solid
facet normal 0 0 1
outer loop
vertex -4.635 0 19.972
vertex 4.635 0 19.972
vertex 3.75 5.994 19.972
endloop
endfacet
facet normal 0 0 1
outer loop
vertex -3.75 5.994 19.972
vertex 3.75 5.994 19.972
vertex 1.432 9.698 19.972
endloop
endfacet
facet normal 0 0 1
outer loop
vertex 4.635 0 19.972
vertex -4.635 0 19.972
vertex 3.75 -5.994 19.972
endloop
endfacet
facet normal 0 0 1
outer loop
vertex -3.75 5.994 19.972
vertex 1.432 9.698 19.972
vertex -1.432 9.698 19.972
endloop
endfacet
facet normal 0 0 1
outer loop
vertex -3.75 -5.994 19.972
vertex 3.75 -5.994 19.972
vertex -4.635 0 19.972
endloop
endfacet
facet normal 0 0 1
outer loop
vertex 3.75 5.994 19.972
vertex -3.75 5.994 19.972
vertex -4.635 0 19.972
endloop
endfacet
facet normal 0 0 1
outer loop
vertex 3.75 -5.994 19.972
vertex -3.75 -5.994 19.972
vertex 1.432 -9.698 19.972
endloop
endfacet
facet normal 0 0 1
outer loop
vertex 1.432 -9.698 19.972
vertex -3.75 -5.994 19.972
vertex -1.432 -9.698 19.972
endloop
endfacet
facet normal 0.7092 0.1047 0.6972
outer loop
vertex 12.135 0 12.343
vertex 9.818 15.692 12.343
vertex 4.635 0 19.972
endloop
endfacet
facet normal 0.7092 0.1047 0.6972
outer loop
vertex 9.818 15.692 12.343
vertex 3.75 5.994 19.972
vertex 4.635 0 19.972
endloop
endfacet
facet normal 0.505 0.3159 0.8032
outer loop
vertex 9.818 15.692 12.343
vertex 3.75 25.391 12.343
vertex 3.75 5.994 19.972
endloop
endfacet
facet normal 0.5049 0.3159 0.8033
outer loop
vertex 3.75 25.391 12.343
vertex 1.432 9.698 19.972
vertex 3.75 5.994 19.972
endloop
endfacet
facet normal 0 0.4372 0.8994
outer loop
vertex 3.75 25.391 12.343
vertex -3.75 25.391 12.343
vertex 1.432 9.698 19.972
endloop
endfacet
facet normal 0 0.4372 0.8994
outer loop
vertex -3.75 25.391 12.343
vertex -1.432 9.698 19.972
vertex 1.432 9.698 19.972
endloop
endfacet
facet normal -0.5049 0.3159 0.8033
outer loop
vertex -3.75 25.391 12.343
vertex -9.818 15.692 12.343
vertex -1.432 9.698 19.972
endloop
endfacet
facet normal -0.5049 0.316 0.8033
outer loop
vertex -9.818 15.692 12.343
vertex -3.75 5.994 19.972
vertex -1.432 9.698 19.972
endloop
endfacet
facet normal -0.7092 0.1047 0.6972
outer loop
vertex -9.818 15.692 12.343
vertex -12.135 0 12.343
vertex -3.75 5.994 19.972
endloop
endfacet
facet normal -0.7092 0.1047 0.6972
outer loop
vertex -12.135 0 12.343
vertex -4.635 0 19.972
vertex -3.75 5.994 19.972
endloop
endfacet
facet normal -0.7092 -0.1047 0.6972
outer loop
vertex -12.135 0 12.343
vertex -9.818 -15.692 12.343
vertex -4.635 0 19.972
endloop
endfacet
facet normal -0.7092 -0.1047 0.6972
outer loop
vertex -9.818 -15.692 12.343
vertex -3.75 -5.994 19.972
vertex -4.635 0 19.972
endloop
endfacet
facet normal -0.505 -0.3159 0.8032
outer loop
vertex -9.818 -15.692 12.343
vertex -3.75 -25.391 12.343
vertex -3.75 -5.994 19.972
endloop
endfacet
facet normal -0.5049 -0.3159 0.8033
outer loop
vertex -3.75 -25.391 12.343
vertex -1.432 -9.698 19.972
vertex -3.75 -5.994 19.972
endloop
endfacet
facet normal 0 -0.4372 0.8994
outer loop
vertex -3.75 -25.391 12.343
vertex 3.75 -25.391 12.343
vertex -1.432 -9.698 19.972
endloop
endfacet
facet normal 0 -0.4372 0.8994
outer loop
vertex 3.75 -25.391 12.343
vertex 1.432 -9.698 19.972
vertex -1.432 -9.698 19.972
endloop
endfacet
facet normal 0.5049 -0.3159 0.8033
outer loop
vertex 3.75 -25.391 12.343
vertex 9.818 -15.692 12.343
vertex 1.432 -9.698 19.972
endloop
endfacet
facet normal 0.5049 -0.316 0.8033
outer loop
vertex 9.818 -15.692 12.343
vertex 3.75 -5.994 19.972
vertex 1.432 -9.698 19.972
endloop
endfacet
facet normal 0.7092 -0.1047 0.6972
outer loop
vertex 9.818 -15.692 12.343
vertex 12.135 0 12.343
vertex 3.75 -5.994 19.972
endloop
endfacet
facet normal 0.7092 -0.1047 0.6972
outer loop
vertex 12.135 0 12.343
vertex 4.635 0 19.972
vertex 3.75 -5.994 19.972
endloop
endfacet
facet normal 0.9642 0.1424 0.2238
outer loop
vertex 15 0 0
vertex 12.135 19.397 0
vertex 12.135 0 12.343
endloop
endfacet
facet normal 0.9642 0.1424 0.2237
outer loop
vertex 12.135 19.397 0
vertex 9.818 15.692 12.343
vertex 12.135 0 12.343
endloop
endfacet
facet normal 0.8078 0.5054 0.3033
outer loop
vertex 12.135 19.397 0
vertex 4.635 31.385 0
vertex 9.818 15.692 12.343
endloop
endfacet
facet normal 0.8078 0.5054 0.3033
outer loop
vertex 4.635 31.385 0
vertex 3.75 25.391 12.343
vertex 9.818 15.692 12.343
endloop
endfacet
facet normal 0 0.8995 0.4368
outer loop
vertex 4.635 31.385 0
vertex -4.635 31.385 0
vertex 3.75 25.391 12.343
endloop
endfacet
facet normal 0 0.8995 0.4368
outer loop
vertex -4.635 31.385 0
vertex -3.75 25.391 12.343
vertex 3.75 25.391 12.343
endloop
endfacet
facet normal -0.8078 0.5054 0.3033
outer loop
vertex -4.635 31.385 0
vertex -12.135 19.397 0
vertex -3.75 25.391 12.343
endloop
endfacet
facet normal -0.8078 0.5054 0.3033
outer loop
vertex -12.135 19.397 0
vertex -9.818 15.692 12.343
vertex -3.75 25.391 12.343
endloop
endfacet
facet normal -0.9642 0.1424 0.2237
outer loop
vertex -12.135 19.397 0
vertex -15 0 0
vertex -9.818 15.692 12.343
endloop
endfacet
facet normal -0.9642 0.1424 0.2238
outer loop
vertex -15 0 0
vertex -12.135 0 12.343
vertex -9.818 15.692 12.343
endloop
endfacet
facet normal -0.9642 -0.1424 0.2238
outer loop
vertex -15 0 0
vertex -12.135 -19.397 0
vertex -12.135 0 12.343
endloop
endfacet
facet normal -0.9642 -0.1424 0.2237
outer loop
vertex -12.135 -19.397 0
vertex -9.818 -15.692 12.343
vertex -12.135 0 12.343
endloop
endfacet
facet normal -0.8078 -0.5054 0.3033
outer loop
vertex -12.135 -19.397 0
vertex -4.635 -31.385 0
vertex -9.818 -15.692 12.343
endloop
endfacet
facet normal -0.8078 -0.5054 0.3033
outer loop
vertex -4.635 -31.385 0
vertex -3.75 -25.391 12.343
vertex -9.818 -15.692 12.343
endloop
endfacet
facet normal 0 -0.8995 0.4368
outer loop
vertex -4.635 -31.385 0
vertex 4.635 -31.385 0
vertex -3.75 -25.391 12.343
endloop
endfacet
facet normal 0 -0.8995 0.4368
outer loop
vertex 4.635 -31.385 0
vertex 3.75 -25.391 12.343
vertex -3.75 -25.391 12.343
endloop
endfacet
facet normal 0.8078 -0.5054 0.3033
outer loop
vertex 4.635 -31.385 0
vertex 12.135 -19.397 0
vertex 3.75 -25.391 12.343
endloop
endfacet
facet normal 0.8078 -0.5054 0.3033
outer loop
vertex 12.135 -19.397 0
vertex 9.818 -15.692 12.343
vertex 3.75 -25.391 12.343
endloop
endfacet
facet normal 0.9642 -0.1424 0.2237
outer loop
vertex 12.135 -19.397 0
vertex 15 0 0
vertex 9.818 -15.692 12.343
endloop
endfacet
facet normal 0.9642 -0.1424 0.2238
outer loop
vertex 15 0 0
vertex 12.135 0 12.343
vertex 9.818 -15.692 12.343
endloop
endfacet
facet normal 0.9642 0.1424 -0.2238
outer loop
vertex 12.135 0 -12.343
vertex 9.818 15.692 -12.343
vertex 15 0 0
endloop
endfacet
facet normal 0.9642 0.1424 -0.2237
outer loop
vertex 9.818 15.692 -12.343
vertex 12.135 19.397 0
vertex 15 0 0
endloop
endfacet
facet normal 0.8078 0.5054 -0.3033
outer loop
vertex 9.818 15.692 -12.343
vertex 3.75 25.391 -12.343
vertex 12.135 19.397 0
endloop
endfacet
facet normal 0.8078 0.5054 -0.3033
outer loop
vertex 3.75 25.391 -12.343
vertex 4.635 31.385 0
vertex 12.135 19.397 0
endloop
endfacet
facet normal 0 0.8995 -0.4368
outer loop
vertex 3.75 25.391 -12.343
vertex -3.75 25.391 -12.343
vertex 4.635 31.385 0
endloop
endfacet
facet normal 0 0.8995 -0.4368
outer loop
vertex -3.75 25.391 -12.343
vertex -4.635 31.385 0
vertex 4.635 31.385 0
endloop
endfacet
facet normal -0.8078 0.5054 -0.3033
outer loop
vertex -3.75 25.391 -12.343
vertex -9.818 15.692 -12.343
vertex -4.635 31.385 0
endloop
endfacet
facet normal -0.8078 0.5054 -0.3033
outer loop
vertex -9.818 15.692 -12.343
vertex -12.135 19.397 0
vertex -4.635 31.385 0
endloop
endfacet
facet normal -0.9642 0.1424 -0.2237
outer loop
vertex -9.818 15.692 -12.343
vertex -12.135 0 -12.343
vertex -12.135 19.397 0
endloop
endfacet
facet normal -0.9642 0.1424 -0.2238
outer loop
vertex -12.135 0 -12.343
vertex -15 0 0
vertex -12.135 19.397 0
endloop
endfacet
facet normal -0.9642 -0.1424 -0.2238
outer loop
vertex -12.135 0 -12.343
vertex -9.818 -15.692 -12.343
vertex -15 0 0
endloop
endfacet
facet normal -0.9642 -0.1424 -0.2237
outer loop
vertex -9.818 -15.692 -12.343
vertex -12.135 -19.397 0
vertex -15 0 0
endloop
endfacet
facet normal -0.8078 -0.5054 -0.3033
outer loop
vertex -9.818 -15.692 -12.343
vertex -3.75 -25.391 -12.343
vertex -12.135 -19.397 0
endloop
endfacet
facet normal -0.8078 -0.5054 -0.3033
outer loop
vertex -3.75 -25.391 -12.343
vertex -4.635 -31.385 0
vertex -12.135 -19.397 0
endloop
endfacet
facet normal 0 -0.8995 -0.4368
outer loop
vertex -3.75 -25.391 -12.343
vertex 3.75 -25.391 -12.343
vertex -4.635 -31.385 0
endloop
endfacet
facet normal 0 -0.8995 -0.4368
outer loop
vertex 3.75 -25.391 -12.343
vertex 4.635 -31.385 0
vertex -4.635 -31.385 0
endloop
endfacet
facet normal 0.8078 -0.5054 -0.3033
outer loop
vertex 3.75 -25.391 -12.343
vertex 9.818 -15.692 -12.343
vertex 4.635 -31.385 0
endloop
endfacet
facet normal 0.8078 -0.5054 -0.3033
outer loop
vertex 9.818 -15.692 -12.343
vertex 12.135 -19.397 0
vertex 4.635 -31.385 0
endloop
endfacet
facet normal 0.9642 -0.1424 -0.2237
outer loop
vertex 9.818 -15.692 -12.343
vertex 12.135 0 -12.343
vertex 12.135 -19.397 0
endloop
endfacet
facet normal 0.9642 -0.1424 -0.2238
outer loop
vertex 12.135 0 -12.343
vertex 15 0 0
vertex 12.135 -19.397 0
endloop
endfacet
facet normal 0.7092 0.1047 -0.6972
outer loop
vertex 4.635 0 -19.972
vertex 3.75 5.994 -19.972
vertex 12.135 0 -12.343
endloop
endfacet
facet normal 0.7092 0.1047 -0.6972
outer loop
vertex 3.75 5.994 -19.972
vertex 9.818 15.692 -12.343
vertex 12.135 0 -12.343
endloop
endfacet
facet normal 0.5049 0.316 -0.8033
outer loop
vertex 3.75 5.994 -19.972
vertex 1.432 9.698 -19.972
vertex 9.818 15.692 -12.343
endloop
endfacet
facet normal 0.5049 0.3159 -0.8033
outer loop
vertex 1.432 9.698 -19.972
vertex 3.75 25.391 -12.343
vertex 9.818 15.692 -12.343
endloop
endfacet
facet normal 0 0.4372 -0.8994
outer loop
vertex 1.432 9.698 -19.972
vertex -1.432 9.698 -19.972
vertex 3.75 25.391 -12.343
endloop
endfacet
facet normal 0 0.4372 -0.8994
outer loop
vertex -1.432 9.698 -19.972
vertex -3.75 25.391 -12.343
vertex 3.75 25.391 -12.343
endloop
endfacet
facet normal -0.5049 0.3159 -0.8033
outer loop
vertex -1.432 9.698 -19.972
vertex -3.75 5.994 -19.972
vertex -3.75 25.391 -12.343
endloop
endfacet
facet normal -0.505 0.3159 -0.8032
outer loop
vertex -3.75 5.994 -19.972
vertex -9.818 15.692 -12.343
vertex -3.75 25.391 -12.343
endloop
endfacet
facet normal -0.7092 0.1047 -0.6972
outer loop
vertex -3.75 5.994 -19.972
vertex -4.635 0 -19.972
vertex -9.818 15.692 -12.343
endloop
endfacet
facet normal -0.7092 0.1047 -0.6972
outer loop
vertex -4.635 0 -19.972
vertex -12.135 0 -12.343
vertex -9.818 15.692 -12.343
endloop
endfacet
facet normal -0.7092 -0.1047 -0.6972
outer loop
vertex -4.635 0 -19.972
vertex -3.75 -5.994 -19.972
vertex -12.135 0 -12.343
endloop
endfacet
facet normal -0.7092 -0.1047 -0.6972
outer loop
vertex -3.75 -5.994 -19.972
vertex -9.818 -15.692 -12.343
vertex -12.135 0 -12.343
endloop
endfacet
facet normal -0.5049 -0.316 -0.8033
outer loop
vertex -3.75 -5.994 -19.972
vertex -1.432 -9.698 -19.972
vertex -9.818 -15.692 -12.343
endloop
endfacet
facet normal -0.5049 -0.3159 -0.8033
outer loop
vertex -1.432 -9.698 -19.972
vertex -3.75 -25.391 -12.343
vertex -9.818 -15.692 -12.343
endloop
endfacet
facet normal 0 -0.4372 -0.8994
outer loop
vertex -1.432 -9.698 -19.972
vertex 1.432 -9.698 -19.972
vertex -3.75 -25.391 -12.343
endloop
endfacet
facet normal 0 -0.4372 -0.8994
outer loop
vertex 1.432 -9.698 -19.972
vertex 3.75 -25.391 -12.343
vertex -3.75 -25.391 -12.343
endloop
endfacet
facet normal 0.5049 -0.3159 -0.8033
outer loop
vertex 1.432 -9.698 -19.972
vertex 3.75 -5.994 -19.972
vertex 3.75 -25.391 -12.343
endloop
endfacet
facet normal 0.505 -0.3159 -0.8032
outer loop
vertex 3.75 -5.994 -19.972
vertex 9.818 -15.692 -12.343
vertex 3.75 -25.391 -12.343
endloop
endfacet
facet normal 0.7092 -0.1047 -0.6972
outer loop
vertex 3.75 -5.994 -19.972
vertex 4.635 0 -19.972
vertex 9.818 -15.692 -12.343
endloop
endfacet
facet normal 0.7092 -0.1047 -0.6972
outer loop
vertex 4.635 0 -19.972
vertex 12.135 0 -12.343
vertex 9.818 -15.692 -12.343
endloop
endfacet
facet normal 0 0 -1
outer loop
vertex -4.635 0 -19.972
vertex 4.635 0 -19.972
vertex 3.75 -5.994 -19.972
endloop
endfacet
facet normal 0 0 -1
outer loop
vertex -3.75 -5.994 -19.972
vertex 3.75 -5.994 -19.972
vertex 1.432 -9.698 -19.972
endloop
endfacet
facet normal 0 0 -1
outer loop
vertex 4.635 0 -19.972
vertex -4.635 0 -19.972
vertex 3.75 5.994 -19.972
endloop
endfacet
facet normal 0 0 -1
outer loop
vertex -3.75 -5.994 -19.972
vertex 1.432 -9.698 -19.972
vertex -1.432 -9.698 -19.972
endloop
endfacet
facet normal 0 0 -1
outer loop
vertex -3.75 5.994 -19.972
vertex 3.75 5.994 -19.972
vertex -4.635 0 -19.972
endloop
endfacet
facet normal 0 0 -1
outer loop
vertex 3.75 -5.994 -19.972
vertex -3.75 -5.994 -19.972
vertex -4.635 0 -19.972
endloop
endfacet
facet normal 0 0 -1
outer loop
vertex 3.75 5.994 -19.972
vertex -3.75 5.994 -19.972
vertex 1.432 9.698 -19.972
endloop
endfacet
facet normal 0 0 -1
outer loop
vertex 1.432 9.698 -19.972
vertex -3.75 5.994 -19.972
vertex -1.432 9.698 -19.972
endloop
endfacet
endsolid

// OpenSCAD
// Generated by SolidPython 1.0.1 on 2020-07-29 00:46:46


scale(v = [5, 11, 7]) {
	sphere(r = 3);
}
/***********************************************
*********      SolidPython code:      **********
************************************************
 
# import packages: SolidPython
from solid import *
from solid.utils import *
from itertools import chain, combinations, permutations


class Resize:

    def __init__(self, scad_file):
        self.scad_file = scad_file
        #self.scad_file = import_scad(scad_file)
        # cone/cylinder param:
        self.r1 = 0
        self.r2 = 0
        self.h = 0
        # rectangular prism param:
        self.w = 0
        self.l = 0
        # ellipse param:
        self.r = 0

    # import OpenScad code (file name corresponds to shape)


    # classify shape + parameters
    def assign(self, param1, param2, param3):
        if self.scad_file == 'cone.scad':
            self.r1 = param1
            self.r2 = param2
            self.h = param3
        elif self.scad_file == 'cylinder.scad':
            self.r1 = param1
            self.r2 = param2
            self.h = param3
        elif self.scad_file == 'rectangularPrism.scad':
            self.h = param1
            self.l = param2
            self.w = param3
        else:
            self.r = param1
            self.h = param2

    # resize parameters
    def iterate(self):
        x = range(3, 20, 2)
        i = 1
        if self.scad_file == 'cone.scad':
            tempList = list(permutations(x, 2))
            for temp in tempList:
                param1 = temp[0]
                param2 = temp[1]
                filepath = 'produced_scad_files/' + 'cone' + str(param1) + '_' + str(param2) + '_' + '.scad'
                scad_render_to_file(cylinder(h=param1, r1=param2, r2=0), filepath)

        elif self.scad_file == 'cylinder.scad':
            tempList = list(permutations(x, 3))
            for temp in tempList:
                param1 = temp[0]
                param2 = temp[1]
                filepath = 'produced_scad_files/' + 'cylinder' + str(param1) + '_' + str(param2) + '_' + '.scad'
                scad_render_to_file(cylinder(h=param1, r1=param2, r2=param2), filepath)

        elif self.scad_file == 'rectangularPrism.scad':
            tempList = list(permutations(x, 3))
            for temp in tempList:
                param1 = temp[0]
                param2 = temp[1]
                param3 = temp[2]
                filepath = 'produced_scad_files/' + 'rectangularPrism' + str(param1) + '_' + str(param2) + '_' + str(
                    param3) + '.scad'
                scad_render_to_file(cube(size=(param1, param2, param3)), filepath)

        elif self.scad_file == 'ellipse.scad':
            tempList = list(permutations(x, 4))
            for temp in tempList:
                param1 = temp[0]
                param2 = temp[1]
                param3 = temp[2]
                param4 = temp[3]
                filepath = 'produced_scad_files/' + 'ellipse' + str(param1) + '_' + str(param2) + '_' + str(param3) + '_' + str(param4) + '.scad'
                scad_render_to_file(scale([param1, param2, param3])(sphere(r=param4)), filepath)

    def render_to_scadfile(self):
        scad_render_to_file(scad, 'example.scad') 
 
************************************************/
